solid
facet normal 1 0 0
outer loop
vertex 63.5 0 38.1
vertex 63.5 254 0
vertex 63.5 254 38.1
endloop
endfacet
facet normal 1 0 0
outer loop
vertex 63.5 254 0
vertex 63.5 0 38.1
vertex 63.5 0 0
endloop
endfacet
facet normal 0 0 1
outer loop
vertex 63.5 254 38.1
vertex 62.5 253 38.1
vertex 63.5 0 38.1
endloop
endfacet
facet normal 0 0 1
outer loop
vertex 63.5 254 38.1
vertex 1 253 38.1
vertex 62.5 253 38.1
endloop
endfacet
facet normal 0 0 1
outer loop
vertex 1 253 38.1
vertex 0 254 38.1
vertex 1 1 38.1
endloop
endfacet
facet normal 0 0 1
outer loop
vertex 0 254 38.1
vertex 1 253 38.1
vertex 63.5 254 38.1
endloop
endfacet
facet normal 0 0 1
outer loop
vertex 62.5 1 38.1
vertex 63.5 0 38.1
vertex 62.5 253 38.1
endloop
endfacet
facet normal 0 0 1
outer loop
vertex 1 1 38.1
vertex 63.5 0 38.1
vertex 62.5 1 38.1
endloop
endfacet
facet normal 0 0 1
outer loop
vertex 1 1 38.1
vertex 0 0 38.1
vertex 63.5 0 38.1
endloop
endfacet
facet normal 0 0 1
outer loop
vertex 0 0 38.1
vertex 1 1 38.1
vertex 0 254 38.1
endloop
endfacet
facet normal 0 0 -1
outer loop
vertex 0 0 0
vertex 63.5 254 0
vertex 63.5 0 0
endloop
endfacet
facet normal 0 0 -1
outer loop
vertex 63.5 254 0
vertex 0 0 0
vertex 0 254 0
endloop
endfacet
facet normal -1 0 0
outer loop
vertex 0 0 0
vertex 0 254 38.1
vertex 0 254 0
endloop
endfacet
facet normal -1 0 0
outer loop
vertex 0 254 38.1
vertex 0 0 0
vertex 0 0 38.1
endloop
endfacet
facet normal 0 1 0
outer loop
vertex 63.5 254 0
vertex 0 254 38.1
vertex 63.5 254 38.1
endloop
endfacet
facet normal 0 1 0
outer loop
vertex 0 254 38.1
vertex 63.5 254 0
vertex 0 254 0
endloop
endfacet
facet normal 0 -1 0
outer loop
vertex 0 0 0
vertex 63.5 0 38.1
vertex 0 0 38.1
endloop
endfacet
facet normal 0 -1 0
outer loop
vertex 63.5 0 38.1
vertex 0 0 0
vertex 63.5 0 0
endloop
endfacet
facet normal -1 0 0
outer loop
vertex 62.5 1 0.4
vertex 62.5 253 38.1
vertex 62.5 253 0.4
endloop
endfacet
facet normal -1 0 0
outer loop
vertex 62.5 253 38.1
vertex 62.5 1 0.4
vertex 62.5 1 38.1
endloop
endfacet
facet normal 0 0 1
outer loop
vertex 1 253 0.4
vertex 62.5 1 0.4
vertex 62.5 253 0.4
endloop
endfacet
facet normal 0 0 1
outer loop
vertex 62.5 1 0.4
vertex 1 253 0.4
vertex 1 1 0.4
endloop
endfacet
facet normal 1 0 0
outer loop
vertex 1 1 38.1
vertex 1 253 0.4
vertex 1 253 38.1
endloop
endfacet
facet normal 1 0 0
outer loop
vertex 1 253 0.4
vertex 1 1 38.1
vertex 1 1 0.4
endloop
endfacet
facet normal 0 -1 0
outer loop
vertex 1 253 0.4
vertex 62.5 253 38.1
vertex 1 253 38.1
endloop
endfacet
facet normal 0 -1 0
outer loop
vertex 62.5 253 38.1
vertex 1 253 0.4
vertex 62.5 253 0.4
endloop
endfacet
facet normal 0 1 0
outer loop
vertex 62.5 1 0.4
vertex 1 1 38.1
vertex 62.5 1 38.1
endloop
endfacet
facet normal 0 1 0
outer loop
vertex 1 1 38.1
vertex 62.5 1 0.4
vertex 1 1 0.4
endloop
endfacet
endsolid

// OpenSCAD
// file: ../bin.scad
module bin(width, depth, height, wall_thickness, floor_thickness) {
    difference() {
        cube([width, depth, height]);
        translate([
            wall_thickness, wall_thickness, floor_thickness
        ]) cube([
            width - 2 * wall_thickness,
            depth - 2 * wall_thickness,
            height - floor_thickness
        ]);
    }
}
// main file
use <../bin.scad>

// 1 inch = 25.4 mm

bin(
    2.5 * 25.4,
    10 * 25.4,
    1.5 * 25.4,
    1,
    0.4
);
